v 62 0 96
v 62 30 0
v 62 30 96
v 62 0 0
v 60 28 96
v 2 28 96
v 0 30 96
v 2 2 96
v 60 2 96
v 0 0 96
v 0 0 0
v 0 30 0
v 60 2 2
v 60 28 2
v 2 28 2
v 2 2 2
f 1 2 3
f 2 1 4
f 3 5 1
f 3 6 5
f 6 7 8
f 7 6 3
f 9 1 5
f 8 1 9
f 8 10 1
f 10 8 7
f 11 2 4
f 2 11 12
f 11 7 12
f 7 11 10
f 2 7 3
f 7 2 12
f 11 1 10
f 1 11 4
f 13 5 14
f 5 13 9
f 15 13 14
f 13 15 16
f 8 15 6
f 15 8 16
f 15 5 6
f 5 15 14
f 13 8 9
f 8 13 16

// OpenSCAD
// file: common.scad
//---------------------------------------------------------------------------
// Common definitions for the Night Light case
//---------------------------------------------------------------------------
// 27-Mar-2014 ShaneG
//
// This file contains the common definitions (dimensions and utility modules)
// used to generate the two halves of the Night Light case.
//---------------------------------------------------------------------------

// Printer resolution (used for spheres and circles)
RESOLUTION = 0.1;

// Shell information
SHELL_SIZE   = 2;

// Size for the board + battery pack
PCB_WIDTH  = 58;
PCB_HEIGHT = 26;
PCB_DEPTH  = 92;

// Case dimensions (bottom)
CASE_WIDTH   = PCB_WIDTH + (2 * SHELL_SIZE);
CASE_HEIGHT  = PCB_HEIGHT + (2 * SHELL_SIZE);
CASE_DEPTH   = PCB_DEPTH + (2 * SHELL_SIZE);

// Overlap sizes
OVERLAP_ADJUST      = 0.25;

CASE_OVERLAP_DEPTH  = SHELL_SIZE * 2;
CASE_OVERLAP_WIDTH  = 2 * OVERLAP_ADJUST;
CASE_OVERLAP_HEIGHT = 2 * OVERLAP_ADJUST;

// Case dimensions (top)
CASE_TOP_WIDTH  = PCB_WIDTH + (2 * SHELL_SIZE);
CASE_TOP_HEIGHT = PCB_HEIGHT + (2 * SHELL_SIZE);
CASE_TOP_DEPTH  = 2 * CASE_OVERLAP_DEPTH;
// main file
/*--------------------------------------------------------------------------*
* 24-May-2014 ShaneG
*
* The bottom part of the case for the Bluebell ambient device.
*--------------------------------------------------------------------------*/
include <common.scad>;

difference() {
  // Build the main cube
  cube(size = [ CASE_WIDTH, CASE_HEIGHT, CASE_DEPTH ], center = false);
  // Make it hollow
  translate(v = [ SHELL_SIZE, SHELL_SIZE, SHELL_SIZE ]) {
    cube(size = [ PCB_WIDTH, PCB_HEIGHT, CASE_DEPTH ], center = false);
    }
  }
